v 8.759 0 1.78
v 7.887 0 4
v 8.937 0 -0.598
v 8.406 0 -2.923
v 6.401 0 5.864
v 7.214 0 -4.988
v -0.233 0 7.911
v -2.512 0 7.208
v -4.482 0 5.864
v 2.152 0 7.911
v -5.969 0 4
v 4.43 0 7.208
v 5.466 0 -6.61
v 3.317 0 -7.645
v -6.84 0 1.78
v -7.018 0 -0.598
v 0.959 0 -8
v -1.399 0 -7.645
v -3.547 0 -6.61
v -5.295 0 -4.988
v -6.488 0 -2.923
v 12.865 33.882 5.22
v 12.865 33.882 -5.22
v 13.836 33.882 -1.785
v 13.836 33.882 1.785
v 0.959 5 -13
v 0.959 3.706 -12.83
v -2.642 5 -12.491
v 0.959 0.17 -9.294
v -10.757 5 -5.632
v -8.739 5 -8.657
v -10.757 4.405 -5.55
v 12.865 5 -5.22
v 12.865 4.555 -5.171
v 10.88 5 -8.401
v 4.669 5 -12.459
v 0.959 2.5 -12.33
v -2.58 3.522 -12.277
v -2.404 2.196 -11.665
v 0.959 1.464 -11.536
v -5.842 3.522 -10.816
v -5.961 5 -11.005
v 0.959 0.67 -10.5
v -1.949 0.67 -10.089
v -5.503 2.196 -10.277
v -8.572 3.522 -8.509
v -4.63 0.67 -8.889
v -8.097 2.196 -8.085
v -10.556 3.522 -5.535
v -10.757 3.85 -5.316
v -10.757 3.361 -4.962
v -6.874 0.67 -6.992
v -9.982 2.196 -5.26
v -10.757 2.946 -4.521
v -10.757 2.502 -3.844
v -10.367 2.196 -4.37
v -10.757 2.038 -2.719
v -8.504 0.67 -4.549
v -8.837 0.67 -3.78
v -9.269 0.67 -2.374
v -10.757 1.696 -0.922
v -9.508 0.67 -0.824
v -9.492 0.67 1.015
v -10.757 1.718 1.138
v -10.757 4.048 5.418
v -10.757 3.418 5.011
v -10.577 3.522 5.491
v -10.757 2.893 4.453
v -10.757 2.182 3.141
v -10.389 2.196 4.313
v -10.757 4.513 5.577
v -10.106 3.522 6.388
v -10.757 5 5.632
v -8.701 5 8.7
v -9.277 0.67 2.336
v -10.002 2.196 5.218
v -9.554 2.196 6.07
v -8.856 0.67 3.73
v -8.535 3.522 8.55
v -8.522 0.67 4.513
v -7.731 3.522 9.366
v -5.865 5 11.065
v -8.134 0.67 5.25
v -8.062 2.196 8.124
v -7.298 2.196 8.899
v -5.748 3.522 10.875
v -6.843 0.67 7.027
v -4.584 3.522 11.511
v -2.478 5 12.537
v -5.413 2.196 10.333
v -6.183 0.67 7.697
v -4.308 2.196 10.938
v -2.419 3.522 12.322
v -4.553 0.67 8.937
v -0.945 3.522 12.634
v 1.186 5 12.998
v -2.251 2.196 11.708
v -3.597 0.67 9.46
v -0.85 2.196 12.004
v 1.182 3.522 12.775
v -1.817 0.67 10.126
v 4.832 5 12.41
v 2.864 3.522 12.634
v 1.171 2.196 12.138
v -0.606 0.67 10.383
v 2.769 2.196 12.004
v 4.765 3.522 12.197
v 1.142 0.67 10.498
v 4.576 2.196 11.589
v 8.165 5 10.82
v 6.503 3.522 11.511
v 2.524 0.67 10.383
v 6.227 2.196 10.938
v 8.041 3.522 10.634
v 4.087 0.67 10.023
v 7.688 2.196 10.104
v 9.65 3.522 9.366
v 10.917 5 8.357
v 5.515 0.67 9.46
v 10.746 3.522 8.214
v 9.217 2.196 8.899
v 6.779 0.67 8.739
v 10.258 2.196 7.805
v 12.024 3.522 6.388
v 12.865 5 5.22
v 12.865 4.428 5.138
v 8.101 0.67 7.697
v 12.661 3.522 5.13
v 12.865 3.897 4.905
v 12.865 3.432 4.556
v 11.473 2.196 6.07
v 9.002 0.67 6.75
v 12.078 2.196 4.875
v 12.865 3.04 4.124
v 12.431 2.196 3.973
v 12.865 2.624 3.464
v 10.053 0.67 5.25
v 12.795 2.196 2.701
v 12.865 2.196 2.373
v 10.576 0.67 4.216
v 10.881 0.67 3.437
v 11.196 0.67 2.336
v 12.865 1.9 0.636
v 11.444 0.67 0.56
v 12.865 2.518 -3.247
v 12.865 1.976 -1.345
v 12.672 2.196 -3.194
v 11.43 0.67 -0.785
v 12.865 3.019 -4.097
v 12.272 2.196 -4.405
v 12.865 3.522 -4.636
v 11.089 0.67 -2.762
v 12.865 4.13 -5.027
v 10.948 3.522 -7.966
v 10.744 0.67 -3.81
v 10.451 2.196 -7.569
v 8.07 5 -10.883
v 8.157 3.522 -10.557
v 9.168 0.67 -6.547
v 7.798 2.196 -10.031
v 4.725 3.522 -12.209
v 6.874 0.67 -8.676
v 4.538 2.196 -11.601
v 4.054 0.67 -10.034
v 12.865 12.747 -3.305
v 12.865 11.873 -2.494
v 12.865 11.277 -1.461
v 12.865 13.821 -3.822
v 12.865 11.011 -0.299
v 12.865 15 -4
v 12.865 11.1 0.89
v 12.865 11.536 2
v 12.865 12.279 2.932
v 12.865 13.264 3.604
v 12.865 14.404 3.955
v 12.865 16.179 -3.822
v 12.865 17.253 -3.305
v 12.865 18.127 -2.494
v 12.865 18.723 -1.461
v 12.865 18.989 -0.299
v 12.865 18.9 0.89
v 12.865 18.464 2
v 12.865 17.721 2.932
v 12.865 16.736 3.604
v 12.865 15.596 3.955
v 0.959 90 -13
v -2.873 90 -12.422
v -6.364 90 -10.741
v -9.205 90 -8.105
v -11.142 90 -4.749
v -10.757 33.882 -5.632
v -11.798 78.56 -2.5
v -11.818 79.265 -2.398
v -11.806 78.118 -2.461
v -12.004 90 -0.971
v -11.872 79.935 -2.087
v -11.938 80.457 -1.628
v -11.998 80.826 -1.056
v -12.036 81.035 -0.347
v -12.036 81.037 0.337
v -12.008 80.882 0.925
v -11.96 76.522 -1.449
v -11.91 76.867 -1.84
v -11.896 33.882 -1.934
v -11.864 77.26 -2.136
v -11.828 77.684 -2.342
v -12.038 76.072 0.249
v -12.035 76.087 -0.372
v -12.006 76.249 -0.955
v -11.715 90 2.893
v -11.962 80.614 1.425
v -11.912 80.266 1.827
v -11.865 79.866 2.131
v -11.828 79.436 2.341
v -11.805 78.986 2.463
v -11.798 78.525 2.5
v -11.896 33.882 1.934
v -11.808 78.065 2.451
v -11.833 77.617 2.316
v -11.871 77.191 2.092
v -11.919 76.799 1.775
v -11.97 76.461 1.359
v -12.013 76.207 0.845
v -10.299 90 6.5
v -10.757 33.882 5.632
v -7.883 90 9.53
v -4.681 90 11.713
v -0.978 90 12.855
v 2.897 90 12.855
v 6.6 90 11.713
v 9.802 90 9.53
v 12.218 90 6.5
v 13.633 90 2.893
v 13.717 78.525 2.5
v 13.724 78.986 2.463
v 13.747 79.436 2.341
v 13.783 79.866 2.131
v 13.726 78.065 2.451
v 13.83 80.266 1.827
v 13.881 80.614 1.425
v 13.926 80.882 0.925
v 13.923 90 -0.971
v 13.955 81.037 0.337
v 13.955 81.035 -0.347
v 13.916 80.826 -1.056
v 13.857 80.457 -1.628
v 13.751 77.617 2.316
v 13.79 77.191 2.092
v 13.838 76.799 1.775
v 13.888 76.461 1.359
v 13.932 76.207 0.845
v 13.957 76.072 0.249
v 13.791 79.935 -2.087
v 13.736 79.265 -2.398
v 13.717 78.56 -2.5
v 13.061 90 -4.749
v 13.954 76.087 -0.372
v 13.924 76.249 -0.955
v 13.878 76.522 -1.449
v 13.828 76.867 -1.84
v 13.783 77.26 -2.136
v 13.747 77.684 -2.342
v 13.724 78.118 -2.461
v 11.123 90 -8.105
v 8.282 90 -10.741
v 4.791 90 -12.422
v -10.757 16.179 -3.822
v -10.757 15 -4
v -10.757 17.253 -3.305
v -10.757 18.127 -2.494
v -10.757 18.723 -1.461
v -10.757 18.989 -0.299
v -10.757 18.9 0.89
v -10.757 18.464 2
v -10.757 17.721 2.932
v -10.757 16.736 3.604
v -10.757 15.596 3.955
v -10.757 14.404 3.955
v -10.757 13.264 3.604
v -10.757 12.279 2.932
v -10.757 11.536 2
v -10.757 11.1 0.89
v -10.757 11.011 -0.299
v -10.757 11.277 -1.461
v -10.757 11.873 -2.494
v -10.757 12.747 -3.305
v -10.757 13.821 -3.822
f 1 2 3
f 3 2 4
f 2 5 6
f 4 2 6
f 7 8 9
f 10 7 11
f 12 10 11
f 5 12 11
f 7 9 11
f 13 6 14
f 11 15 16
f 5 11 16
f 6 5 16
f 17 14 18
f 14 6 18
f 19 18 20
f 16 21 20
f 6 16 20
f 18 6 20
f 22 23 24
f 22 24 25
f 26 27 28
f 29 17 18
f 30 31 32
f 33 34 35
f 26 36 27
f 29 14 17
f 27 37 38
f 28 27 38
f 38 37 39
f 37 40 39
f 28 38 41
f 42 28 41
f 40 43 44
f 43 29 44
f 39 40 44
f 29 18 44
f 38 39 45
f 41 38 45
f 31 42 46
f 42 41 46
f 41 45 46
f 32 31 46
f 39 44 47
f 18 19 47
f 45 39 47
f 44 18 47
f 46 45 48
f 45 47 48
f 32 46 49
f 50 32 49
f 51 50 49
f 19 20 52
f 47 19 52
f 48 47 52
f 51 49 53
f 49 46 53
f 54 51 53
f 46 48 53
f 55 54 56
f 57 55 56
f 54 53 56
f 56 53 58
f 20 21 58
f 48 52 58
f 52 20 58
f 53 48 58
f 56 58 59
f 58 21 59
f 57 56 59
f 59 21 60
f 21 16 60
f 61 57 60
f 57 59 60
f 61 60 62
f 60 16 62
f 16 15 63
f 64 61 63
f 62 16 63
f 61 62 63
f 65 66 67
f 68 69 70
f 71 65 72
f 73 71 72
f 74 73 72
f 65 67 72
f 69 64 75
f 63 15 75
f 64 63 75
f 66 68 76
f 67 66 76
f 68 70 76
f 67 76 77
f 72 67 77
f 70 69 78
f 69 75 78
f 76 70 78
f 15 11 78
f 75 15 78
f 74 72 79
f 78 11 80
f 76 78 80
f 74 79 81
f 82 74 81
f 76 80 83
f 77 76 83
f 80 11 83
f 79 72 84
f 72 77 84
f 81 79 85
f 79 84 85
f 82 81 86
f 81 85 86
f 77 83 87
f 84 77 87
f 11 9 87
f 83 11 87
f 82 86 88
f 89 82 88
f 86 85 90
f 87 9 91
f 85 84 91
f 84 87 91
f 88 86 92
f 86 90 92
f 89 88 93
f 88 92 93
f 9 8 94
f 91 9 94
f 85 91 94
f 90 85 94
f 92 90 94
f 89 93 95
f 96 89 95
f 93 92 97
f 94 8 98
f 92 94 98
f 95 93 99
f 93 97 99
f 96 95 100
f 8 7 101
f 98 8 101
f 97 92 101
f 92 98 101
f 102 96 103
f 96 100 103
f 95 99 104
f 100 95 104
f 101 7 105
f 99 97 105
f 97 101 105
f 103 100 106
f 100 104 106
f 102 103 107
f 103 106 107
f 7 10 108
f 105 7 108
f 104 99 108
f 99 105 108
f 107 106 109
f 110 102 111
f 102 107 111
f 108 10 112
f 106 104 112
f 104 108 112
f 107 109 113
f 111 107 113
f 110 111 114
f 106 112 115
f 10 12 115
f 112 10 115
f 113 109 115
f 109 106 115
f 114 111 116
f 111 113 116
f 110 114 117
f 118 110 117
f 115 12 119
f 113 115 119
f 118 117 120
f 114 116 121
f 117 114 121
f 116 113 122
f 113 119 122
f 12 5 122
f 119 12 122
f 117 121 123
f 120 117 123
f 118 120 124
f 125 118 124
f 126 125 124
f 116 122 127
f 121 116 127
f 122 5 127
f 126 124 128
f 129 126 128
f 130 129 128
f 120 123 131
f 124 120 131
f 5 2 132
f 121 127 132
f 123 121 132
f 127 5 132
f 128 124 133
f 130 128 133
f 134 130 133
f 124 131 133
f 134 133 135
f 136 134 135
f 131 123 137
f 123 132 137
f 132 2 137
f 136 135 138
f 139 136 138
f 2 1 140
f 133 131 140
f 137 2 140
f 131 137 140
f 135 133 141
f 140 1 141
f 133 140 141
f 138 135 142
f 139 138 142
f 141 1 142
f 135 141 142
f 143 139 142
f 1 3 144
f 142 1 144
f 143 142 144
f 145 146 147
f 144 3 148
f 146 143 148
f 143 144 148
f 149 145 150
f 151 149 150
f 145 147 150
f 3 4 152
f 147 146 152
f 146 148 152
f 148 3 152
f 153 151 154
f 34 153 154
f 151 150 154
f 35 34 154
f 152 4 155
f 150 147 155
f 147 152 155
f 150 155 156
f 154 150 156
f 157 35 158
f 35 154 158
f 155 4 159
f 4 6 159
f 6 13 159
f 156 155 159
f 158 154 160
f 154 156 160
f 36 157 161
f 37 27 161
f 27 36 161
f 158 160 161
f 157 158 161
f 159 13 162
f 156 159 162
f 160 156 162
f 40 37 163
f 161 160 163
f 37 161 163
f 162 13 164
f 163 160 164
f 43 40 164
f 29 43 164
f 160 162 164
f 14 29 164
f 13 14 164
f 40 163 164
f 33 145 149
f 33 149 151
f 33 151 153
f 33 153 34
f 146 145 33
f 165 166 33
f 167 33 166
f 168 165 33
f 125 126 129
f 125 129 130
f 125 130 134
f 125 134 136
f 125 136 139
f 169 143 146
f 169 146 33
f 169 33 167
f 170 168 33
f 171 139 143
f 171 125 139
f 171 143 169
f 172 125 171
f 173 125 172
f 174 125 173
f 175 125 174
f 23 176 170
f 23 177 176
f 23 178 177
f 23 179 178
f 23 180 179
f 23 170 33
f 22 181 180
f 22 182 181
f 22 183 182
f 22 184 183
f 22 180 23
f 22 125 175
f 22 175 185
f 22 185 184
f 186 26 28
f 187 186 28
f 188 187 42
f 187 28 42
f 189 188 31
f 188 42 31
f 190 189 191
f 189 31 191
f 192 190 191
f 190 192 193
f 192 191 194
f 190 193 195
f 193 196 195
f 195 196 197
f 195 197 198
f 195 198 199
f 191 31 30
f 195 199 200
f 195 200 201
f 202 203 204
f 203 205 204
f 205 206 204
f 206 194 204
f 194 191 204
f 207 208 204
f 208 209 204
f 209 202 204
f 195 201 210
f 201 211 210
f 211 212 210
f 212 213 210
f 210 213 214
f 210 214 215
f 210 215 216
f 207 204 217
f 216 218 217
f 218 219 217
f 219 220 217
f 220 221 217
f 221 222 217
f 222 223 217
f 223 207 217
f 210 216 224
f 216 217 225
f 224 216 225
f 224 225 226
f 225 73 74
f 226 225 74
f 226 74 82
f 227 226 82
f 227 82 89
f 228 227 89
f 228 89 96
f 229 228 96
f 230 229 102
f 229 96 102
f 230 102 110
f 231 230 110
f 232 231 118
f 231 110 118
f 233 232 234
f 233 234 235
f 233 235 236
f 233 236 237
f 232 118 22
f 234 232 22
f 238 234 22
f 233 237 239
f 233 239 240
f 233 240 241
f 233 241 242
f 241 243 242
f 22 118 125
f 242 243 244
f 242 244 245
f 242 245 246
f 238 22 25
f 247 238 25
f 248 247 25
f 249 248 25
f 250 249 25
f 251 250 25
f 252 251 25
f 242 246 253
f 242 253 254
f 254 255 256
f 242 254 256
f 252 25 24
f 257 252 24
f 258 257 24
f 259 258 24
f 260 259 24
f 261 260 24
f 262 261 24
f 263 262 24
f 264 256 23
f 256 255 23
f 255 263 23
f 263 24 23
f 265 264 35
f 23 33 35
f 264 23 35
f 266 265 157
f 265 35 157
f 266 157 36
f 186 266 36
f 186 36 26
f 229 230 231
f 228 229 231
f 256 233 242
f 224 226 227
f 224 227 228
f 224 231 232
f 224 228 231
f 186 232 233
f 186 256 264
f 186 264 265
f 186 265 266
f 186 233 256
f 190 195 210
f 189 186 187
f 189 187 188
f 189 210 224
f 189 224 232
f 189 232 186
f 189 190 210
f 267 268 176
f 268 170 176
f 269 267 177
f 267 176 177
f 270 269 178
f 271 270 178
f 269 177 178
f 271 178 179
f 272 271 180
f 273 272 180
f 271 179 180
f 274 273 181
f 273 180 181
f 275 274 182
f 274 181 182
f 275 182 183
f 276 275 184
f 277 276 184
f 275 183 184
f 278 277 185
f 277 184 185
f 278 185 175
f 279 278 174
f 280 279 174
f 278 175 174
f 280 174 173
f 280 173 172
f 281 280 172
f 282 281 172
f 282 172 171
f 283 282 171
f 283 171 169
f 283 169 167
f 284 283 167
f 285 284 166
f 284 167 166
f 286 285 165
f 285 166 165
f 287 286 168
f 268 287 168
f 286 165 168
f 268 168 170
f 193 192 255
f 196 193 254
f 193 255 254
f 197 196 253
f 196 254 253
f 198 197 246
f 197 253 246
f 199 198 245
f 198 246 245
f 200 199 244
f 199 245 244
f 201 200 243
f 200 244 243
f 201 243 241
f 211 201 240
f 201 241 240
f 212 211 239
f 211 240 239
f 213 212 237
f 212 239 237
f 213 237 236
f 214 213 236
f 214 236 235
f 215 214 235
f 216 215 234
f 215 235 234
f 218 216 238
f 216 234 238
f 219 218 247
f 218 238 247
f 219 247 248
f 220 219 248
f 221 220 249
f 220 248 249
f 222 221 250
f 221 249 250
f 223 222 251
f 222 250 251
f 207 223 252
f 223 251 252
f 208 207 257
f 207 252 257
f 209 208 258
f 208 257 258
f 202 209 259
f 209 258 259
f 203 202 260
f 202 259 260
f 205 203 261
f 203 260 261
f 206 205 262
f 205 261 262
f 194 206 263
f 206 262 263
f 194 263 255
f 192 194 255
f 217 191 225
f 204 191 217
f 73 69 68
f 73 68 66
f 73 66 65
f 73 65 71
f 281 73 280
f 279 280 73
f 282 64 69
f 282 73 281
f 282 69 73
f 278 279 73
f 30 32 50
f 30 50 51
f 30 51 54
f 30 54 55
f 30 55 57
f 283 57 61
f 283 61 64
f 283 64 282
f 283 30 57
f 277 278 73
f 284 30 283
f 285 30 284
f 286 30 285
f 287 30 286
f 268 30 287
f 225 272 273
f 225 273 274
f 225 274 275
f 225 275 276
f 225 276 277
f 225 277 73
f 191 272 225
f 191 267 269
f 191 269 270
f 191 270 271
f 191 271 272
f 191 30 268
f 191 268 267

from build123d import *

# Parameters (mm, degrees)
SKETCH_1_R          = 13
EXTRUDE_1_DEPTH     = 90
FILLET_1_R          = 5
SKETCH_3_R          = 4
CUT_EXTRUDE_2_DEPTH = 20
SKETCH_4_W          = 5.638292822
SKETCH_4_H          = 34.801876381
CUT_EXTRUDE_3_DEPTH = 22.5
SKETCH_5_R          = 2.5
CUT_EXTRUDE_1_DEPTH = 55


with BuildPart() as part:
    # Эскиз1 → Вытянуть1 (new body)
    with BuildSketch(Plane(origin=(0, 0, 0), x_dir=(1, 0, 0), z_dir=(0, 1, 0))):
        with Locations(Location((0.959256222, 0, 0), (0, 0, 90))):
            Circle(SKETCH_1_R)
    extrude(amount=EXTRUDE_1_DEPTH)

    # Скругление1
    fillet_1_edges = [part.edges().sort_by_distance(p)[0] for p in [
        (0.959256222, 0, 13),
    ]]
    fillet(fillet_1_edges, radius=FILLET_1_R)

    # Эскиз3 → Вытянуть2 (cut, symmetric)
    with BuildSketch(Plane(origin=(0, 0, 0), x_dir=(0, 0, -1), z_dir=(1, 0, 0))):
        with Locations((0, 15)):
            Circle(SKETCH_3_R)
    extrude(amount=CUT_EXTRUDE_2_DEPTH, both=True, mode=Mode.SUBTRACT)

    # Эскиз4 → Вытянуть3 (cut, symmetric)
    with BuildSketch(Plane.XY):
        with Locations((-13.576502311, 16.48112444)):
            Rectangle(SKETCH_4_W, SKETCH_4_H)
        with Locations((15.684293194, 16.48112444)):
            Rectangle(SKETCH_4_W, SKETCH_4_H)
    extrude(amount=CUT_EXTRUDE_3_DEPTH, both=True, mode=Mode.SUBTRACT)

    # Эскиз5 → Вырез-Вытянуть1 (cut, symmetric)
    with BuildSketch(Plane(origin=(0, 0, 0), x_dir=(0, 0, -1), z_dir=(1, 0, 0))):
        with Locations((9.34e-07, 78.55964506)):
            Circle(SKETCH_5_R)
    extrude(amount=CUT_EXTRUDE_1_DEPTH, both=True, mode=Mode.SUBTRACT)


solid = part.part
